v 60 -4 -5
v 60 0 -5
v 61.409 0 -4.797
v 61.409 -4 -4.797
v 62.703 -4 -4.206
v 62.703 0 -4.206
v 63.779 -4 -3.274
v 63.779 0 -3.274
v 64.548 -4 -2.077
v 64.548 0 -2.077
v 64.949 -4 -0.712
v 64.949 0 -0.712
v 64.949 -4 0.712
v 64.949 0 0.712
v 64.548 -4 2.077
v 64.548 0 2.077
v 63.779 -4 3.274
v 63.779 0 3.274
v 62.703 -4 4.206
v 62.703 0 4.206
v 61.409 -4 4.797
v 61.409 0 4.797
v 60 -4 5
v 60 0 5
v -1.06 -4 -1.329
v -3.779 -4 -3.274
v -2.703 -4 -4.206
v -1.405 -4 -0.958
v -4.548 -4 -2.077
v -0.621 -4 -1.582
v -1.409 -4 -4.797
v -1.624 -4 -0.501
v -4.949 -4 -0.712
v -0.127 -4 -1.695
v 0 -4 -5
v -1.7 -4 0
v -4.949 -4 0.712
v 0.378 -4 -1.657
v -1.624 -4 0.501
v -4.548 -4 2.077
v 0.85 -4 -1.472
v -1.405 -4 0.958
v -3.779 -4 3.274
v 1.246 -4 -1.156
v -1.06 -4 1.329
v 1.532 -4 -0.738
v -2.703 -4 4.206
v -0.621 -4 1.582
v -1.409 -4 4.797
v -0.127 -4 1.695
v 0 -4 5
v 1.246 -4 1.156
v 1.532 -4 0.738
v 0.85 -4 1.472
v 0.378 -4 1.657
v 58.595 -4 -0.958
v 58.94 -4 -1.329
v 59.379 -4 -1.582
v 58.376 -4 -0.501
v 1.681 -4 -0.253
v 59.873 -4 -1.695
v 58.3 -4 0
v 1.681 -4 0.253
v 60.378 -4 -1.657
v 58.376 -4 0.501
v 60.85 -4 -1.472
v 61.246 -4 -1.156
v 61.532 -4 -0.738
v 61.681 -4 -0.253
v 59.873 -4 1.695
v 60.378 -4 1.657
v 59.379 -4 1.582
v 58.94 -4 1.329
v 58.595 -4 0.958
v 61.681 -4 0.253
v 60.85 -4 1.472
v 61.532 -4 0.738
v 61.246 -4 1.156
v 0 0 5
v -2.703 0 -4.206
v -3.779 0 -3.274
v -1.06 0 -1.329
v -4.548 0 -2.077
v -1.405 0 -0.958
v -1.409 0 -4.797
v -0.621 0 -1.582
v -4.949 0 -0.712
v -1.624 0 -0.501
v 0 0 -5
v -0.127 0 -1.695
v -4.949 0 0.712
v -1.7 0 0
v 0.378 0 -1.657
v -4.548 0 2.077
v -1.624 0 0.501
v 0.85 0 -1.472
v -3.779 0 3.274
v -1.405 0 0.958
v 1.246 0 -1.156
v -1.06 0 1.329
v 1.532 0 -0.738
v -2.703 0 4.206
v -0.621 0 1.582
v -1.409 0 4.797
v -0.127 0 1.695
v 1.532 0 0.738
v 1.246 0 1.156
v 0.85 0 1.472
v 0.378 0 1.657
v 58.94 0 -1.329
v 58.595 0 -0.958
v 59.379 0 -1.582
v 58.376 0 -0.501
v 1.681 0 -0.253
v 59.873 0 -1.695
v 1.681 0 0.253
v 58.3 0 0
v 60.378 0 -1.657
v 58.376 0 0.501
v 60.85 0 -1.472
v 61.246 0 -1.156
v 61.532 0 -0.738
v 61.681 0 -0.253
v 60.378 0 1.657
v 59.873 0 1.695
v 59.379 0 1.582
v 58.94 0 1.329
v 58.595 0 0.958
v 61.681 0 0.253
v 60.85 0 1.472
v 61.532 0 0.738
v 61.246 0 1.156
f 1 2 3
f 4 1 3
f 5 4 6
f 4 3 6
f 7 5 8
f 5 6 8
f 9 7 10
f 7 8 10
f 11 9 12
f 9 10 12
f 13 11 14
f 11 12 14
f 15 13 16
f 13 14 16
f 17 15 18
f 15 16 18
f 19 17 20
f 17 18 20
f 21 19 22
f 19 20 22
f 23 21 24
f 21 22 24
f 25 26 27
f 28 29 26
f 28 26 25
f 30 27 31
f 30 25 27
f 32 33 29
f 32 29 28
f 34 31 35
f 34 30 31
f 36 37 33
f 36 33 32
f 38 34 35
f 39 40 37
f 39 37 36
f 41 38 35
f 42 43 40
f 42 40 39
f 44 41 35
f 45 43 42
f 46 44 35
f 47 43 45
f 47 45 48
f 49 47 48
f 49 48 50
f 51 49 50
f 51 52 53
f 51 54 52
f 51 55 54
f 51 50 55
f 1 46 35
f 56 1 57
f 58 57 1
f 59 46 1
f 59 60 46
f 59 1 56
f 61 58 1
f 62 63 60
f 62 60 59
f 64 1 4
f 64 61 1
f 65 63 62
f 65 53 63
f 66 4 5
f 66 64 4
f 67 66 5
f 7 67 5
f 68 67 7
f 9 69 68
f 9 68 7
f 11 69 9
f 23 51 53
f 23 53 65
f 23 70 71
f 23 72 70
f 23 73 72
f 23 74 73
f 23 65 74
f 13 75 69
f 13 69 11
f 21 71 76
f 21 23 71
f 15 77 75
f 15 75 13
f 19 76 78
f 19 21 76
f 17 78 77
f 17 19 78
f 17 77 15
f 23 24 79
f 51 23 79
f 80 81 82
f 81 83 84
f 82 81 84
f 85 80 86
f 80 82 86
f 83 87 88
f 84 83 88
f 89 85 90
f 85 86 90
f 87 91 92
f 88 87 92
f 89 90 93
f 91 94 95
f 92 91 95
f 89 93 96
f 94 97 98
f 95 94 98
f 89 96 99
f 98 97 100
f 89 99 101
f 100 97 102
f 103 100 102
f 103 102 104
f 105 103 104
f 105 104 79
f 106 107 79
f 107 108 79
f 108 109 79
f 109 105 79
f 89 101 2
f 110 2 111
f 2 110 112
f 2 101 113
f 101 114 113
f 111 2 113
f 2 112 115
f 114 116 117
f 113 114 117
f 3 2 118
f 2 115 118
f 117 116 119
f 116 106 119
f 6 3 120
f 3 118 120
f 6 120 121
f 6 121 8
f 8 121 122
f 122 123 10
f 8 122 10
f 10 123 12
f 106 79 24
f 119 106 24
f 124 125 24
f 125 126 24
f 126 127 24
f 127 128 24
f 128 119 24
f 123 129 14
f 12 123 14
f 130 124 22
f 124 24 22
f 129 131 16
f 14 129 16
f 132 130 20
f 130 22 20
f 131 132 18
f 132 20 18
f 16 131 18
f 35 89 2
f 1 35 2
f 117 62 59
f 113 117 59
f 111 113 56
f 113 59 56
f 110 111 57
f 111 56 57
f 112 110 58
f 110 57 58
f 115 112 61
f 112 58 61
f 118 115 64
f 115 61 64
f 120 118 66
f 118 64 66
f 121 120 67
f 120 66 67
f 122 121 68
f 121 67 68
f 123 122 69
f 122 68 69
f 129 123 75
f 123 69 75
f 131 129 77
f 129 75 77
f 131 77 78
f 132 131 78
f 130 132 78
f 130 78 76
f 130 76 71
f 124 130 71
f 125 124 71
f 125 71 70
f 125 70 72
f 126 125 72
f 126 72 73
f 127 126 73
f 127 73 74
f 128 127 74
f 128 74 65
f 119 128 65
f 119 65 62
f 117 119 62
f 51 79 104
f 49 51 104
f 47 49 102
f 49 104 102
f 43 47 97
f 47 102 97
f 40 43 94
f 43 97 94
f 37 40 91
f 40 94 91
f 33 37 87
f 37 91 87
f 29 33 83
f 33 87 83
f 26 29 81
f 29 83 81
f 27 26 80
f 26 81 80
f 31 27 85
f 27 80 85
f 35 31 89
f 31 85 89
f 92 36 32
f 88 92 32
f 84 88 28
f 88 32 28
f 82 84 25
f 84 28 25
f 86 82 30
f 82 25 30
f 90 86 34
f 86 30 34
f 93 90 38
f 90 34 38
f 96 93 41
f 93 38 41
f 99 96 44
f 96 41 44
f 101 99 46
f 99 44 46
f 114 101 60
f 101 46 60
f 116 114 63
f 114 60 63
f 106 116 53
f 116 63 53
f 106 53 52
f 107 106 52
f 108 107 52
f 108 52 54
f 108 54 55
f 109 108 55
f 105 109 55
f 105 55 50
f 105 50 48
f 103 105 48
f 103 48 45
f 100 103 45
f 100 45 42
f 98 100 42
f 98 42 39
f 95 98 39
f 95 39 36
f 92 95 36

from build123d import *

# Parameters (mm, degrees)
F1_DEPTH = 4
F2_D     = 3.4


with BuildPart() as f1:
    # F0 (on Front) → F1 (new body)
    with BuildSketch(Plane.XZ):
        with BuildLine():
            Line((60, 5), (0, 5))
            ThreePointArc((0, 5), (-5, 0), (0, -5))
            Line((0, -5), (60, -5))
            ThreePointArc((60, -5), (65, 0), (60, 5))
        make_face()
    extrude(amount=F1_DEPTH)

    # F2 (through all)
    with Locations(Plane(origin=(0, 0, 0), x_dir=(1, 0, 0), z_dir=(0, 1, 0))):
        with Locations((0, 0), (60, 0)):
            Hole(F2_D / 2)


solid = f1.part
